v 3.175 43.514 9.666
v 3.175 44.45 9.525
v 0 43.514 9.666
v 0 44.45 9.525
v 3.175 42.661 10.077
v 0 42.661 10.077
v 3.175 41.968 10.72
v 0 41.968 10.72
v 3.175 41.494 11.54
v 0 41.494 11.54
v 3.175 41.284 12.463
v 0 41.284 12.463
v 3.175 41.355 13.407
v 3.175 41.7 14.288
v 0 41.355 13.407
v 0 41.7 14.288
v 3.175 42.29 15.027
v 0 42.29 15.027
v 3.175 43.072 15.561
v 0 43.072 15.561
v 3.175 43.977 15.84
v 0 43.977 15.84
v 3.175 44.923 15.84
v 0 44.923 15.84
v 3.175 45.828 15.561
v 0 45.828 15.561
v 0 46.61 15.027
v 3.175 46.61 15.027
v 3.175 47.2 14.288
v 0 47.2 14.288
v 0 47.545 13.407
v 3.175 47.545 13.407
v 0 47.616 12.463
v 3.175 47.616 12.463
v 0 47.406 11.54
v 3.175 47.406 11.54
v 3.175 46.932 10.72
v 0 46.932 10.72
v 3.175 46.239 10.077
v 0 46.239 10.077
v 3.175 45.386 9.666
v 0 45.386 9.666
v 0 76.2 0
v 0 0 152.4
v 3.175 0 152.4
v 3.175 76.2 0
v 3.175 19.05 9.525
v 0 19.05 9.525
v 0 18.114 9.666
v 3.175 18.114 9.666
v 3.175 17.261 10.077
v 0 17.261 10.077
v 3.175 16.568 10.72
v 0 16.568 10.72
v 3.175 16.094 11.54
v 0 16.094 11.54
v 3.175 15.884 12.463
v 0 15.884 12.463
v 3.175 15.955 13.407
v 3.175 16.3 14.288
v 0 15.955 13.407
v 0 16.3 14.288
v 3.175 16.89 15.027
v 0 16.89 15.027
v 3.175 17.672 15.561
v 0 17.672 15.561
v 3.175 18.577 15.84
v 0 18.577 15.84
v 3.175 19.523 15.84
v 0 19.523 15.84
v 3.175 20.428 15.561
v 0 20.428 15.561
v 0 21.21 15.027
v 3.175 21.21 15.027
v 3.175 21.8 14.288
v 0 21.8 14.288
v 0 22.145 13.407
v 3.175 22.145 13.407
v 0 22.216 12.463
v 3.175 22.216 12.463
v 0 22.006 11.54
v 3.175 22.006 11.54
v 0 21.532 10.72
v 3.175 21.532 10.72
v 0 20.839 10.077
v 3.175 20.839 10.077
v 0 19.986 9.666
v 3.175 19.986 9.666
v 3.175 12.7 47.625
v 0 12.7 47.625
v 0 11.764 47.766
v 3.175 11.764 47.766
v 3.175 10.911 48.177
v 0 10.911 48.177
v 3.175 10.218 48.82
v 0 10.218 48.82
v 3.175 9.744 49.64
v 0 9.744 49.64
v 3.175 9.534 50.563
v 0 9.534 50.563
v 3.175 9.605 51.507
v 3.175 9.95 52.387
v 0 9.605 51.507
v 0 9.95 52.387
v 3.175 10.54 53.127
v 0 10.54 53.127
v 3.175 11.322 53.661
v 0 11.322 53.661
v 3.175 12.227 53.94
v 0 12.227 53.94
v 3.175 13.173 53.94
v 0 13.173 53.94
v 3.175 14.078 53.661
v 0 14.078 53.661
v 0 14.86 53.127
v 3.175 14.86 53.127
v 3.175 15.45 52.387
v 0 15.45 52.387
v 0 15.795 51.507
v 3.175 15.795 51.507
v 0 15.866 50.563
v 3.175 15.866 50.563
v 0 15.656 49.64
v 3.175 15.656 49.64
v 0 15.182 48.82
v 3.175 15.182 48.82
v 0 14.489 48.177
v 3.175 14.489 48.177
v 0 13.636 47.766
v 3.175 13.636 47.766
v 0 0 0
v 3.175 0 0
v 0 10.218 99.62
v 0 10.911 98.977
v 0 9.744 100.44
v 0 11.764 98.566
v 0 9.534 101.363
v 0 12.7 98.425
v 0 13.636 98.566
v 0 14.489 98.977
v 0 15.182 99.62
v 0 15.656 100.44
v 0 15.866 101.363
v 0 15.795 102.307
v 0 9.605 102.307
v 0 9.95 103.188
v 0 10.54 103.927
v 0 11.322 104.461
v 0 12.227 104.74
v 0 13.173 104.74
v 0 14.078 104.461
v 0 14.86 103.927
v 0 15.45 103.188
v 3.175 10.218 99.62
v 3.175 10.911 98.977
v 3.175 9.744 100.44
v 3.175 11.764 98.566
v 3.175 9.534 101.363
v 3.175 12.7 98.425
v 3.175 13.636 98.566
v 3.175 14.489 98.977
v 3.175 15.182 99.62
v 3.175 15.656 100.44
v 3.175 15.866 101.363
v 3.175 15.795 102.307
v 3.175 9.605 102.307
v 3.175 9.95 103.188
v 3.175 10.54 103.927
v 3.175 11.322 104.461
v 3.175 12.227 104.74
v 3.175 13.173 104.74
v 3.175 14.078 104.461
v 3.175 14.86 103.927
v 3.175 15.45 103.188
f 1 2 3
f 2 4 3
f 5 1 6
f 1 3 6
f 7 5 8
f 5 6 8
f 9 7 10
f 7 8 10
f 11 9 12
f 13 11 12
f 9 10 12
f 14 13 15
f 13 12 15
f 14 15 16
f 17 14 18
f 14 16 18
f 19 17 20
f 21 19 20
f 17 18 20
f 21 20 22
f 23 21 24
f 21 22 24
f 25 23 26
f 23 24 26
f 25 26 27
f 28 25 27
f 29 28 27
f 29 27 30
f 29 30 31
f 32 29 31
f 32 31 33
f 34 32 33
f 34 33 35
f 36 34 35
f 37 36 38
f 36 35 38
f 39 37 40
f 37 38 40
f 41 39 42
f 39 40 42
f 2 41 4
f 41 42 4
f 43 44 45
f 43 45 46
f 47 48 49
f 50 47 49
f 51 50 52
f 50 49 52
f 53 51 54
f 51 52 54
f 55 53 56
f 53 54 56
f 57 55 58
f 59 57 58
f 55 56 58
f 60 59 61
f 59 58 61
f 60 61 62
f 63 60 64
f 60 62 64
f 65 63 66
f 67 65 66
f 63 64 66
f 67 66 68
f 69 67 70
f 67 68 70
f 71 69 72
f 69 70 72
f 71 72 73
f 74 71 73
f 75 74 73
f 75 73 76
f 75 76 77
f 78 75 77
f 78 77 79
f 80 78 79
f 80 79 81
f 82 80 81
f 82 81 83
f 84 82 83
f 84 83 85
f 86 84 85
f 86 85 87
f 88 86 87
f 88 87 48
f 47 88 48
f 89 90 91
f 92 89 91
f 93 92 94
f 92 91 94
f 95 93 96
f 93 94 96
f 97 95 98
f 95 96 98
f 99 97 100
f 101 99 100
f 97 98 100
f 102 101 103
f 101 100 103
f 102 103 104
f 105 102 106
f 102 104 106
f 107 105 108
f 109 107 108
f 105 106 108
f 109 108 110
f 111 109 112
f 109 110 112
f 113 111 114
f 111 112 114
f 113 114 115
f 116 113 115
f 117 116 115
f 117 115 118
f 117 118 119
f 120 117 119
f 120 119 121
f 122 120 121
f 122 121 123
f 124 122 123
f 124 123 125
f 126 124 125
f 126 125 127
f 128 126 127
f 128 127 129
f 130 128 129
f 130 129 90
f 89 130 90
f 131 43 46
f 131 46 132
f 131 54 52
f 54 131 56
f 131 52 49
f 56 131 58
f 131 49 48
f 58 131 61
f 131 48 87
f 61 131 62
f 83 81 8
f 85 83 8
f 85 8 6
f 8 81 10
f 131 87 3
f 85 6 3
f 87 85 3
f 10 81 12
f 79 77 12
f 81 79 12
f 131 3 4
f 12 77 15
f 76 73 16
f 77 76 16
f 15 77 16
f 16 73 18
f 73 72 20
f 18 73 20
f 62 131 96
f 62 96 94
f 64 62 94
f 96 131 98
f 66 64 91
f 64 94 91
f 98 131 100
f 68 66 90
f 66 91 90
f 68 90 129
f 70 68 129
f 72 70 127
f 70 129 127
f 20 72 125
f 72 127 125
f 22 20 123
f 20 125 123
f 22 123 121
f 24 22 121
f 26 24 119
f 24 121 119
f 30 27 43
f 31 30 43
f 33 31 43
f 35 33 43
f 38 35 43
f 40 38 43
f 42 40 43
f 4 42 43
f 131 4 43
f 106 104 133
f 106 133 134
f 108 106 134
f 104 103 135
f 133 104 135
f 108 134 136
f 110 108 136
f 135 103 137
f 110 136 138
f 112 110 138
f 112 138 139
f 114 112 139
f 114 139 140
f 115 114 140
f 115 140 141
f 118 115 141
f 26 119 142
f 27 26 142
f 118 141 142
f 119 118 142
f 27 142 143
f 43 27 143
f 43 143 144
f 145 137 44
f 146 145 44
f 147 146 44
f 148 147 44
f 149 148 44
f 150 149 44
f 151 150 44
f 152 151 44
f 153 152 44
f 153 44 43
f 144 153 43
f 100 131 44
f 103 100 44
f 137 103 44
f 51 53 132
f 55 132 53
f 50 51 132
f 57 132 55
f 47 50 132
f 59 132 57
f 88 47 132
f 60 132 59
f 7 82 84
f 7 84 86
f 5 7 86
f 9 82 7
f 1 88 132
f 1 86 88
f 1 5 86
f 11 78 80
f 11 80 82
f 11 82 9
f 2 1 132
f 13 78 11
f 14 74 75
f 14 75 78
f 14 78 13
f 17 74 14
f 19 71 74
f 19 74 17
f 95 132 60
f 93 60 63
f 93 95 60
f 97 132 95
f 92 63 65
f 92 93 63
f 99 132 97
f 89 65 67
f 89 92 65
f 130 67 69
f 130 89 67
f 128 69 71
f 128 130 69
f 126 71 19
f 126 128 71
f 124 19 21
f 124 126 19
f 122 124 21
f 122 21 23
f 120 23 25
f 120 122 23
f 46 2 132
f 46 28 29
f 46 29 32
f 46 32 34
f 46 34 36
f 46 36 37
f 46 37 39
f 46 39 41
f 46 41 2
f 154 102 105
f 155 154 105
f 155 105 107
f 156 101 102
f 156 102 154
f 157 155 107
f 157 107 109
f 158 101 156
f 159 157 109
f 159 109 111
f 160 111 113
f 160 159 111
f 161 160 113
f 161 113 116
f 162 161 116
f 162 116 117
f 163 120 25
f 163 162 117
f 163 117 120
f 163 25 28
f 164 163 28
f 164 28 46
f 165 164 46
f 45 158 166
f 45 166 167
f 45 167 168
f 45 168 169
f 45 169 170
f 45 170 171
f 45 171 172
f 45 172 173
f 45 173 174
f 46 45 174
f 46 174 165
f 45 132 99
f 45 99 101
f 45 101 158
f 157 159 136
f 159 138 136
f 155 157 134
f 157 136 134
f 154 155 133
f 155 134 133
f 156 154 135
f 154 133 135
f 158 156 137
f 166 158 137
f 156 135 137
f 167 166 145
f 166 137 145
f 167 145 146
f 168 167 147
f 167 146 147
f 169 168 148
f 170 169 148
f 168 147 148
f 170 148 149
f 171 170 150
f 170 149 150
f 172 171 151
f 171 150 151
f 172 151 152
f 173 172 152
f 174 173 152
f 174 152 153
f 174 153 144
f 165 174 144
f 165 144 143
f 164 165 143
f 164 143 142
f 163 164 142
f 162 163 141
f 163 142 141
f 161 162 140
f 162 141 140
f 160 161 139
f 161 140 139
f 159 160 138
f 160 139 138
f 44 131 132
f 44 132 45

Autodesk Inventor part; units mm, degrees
ref_plane "YZ Plane" through (0, 0, 0) normal (1, 0, 0) x (0, 1, 0)
ref_plane "XZ Plane" through (0, 0, 0) normal (0, 1, 0) x (-1, 0, 0)
ref_plane "XY Plane" through (0, 0, 0) normal (0, 0, 1) x (1, 0, 0)
sketch "Sketch1" plane through (0, 0, 0) normal (1, 0, 0) x (0, 1, 0)
  line L0 (0, 0) -> (0, 152.4)
  line L1 (0, 152.4) -> (76.2, 0)
  line L2 (76.2, 0) -> (0, 0)
  dimension "d0" = 152.4
  dimension "d1" = 76.2
extrude "Extrusion1" add sketch "Sketch1" along normal blind 3.175
sketch "Sketch2" plane through (3.175, 0, 0) normal (1, 0, 0) x (0, 0, -1)
  line L0 (-152.4, 0) -> (0, 0) projected
  line L1 (0, 0) -> (0, 76.2) projected
  point P0 (-12.7, 44.45)
  point P1 (-12.7, 19.05)
  dimension "d4" = 12.7
  dimension "d5" = 12.7
  dimension "d6" = 19.05
  dimension "d7" = 25.4
hole "Hole2" at (3.175, 44.45, 12.7) at (3.175, 19.05, 12.7) direction (-1, 0, 0) diameter 6.35 end through all
sketch "Sketch4" plane through (3.175, 0, 0) normal (1, 0, 0) x (0, 0, -1)
  line L0 (-152.4, 0) -> (0, 0) projected
  line L1 (0, 0) -> (0, 76.2) projected
  point P0 (-101.6, 12.7)
  point P1 (-50.8, 12.7)
  dimension "d25" = 12.7
  dimension "d26" = 12.7
  dimension "d27" = 50.8
  dimension "d28" = 50.8
hole "Hole3" at (3.175, 12.7, 101.6) at (3.175, 12.7, 50.8) direction (-1, 0, 0) diameter 6.35 end through all
properties part number "Support_Side_Front" material "Aluminum 6061"
